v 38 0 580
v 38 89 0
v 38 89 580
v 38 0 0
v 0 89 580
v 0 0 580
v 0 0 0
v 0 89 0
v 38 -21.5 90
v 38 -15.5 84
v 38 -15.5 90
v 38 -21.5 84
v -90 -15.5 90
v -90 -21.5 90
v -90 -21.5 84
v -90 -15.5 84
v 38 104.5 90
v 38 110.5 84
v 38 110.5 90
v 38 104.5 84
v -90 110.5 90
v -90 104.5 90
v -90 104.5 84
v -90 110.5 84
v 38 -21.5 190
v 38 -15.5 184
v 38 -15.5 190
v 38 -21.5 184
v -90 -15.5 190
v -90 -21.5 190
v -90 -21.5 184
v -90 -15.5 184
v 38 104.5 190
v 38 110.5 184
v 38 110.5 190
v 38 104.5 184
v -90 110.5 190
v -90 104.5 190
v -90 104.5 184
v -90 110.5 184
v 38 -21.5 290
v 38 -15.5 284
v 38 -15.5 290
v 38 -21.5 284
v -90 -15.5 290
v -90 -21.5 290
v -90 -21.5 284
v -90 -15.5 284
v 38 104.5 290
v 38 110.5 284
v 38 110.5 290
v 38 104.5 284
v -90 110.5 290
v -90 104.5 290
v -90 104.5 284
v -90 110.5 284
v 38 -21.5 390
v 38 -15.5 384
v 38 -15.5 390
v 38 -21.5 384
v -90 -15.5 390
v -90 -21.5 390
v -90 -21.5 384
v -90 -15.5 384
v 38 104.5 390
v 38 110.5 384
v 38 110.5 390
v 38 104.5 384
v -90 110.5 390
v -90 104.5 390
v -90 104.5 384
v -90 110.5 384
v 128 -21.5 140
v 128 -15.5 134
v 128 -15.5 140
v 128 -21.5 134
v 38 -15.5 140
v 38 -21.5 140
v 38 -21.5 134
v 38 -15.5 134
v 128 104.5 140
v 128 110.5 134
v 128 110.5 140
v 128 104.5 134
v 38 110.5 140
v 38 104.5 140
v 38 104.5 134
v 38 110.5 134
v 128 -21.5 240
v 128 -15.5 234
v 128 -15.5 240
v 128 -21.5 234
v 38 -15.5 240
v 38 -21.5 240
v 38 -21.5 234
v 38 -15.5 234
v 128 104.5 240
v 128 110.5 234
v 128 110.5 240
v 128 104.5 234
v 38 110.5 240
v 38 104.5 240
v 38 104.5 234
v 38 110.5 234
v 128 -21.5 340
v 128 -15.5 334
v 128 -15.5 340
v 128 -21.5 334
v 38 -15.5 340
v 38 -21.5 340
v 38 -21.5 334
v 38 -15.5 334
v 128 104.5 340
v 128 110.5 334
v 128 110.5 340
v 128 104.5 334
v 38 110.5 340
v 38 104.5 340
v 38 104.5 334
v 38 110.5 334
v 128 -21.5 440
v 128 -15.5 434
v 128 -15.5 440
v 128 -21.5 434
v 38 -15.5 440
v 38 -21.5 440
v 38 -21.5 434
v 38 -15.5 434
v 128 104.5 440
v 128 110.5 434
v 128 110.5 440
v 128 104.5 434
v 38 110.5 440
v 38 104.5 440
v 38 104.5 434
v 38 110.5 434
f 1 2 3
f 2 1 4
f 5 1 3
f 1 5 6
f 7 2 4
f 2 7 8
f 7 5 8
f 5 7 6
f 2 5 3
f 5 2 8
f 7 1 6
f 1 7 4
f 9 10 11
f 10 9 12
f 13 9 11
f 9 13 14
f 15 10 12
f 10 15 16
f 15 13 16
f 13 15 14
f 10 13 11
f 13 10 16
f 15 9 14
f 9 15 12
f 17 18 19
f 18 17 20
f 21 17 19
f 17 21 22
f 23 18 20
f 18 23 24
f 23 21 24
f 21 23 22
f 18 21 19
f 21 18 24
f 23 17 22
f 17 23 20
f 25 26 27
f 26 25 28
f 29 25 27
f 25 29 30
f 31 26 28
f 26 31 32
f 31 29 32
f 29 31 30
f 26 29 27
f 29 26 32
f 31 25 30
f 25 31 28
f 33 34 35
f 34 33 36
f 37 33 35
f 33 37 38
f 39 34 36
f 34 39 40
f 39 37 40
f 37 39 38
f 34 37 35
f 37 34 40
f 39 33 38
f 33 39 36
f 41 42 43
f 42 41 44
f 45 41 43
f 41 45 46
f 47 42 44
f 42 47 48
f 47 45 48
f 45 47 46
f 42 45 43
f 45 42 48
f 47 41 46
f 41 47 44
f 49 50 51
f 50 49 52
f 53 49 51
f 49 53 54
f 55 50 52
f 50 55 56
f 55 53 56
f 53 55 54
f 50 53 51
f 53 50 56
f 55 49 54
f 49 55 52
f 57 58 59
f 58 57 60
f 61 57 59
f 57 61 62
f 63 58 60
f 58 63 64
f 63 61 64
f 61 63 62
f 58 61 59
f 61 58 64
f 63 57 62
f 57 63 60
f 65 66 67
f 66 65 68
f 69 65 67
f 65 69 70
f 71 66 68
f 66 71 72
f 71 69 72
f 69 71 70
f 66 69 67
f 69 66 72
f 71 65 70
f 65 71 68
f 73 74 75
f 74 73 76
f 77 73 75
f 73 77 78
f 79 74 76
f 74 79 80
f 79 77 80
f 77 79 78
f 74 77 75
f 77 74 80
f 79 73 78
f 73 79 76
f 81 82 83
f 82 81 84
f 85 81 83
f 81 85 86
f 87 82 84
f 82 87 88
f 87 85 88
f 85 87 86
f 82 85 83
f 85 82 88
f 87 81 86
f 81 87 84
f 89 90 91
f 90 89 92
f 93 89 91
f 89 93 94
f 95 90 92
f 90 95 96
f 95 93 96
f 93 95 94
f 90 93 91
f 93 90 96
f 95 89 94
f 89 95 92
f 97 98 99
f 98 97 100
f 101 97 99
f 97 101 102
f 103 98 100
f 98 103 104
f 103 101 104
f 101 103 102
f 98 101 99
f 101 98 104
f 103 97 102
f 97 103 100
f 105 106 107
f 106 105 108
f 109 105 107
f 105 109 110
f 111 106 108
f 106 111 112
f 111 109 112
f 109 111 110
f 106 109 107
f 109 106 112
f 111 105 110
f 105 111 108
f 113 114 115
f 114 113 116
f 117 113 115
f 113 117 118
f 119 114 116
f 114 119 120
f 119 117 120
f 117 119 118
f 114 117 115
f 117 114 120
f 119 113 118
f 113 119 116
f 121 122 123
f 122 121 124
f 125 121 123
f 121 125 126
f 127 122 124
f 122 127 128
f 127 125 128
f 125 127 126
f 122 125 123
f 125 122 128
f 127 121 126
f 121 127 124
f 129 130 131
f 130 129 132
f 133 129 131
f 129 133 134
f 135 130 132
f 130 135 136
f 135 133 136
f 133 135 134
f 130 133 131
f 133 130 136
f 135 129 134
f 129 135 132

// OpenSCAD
// baebugs wood tower: post + cantilevered rail arms (generated from config/tower.yaml; MEASURE values)
post = [38, 89, 580.0]; tray = [90.0, 120.0]; strip = [12.0, 6.0];
cube(post);
translate([-90.0, -21.5, 84.0]) cube([128.0, strip[1], 6]);  // storage L0
translate([-90.0, 104.5, 84.0]) cube([128.0, strip[1], 6]);  // storage L0
translate([-90.0, -21.5, 184.0]) cube([128.0, strip[1], 6]);  // storage L1
translate([-90.0, 104.5, 184.0]) cube([128.0, strip[1], 6]);  // storage L1
translate([-90.0, -21.5, 284.0]) cube([128.0, strip[1], 6]);  // storage L2
translate([-90.0, 104.5, 284.0]) cube([128.0, strip[1], 6]);  // storage L2
translate([-90.0, -21.5, 384.0]) cube([128.0, strip[1], 6]);  // storage L3
translate([-90.0, 104.5, 384.0]) cube([128.0, strip[1], 6]);  // storage L3
translate([38.0, -21.5, 134.0]) cube([90.0, strip[1], 6]);  // filter L0
translate([38.0, 104.5, 134.0]) cube([90.0, strip[1], 6]);  // filter L0
translate([38.0, -21.5, 234.0]) cube([90.0, strip[1], 6]);  // filter L1
translate([38.0, 104.5, 234.0]) cube([90.0, strip[1], 6]);  // filter L1
translate([38.0, -21.5, 334.0]) cube([90.0, strip[1], 6]);  // filter L2
translate([38.0, 104.5, 334.0]) cube([90.0, strip[1], 6]);  // filter L2
translate([38.0, -21.5, 434.0]) cube([90.0, strip[1], 6]);  // filter L3
translate([38.0, 104.5, 434.0]) cube([90.0, strip[1], 6]);  // filter L3
